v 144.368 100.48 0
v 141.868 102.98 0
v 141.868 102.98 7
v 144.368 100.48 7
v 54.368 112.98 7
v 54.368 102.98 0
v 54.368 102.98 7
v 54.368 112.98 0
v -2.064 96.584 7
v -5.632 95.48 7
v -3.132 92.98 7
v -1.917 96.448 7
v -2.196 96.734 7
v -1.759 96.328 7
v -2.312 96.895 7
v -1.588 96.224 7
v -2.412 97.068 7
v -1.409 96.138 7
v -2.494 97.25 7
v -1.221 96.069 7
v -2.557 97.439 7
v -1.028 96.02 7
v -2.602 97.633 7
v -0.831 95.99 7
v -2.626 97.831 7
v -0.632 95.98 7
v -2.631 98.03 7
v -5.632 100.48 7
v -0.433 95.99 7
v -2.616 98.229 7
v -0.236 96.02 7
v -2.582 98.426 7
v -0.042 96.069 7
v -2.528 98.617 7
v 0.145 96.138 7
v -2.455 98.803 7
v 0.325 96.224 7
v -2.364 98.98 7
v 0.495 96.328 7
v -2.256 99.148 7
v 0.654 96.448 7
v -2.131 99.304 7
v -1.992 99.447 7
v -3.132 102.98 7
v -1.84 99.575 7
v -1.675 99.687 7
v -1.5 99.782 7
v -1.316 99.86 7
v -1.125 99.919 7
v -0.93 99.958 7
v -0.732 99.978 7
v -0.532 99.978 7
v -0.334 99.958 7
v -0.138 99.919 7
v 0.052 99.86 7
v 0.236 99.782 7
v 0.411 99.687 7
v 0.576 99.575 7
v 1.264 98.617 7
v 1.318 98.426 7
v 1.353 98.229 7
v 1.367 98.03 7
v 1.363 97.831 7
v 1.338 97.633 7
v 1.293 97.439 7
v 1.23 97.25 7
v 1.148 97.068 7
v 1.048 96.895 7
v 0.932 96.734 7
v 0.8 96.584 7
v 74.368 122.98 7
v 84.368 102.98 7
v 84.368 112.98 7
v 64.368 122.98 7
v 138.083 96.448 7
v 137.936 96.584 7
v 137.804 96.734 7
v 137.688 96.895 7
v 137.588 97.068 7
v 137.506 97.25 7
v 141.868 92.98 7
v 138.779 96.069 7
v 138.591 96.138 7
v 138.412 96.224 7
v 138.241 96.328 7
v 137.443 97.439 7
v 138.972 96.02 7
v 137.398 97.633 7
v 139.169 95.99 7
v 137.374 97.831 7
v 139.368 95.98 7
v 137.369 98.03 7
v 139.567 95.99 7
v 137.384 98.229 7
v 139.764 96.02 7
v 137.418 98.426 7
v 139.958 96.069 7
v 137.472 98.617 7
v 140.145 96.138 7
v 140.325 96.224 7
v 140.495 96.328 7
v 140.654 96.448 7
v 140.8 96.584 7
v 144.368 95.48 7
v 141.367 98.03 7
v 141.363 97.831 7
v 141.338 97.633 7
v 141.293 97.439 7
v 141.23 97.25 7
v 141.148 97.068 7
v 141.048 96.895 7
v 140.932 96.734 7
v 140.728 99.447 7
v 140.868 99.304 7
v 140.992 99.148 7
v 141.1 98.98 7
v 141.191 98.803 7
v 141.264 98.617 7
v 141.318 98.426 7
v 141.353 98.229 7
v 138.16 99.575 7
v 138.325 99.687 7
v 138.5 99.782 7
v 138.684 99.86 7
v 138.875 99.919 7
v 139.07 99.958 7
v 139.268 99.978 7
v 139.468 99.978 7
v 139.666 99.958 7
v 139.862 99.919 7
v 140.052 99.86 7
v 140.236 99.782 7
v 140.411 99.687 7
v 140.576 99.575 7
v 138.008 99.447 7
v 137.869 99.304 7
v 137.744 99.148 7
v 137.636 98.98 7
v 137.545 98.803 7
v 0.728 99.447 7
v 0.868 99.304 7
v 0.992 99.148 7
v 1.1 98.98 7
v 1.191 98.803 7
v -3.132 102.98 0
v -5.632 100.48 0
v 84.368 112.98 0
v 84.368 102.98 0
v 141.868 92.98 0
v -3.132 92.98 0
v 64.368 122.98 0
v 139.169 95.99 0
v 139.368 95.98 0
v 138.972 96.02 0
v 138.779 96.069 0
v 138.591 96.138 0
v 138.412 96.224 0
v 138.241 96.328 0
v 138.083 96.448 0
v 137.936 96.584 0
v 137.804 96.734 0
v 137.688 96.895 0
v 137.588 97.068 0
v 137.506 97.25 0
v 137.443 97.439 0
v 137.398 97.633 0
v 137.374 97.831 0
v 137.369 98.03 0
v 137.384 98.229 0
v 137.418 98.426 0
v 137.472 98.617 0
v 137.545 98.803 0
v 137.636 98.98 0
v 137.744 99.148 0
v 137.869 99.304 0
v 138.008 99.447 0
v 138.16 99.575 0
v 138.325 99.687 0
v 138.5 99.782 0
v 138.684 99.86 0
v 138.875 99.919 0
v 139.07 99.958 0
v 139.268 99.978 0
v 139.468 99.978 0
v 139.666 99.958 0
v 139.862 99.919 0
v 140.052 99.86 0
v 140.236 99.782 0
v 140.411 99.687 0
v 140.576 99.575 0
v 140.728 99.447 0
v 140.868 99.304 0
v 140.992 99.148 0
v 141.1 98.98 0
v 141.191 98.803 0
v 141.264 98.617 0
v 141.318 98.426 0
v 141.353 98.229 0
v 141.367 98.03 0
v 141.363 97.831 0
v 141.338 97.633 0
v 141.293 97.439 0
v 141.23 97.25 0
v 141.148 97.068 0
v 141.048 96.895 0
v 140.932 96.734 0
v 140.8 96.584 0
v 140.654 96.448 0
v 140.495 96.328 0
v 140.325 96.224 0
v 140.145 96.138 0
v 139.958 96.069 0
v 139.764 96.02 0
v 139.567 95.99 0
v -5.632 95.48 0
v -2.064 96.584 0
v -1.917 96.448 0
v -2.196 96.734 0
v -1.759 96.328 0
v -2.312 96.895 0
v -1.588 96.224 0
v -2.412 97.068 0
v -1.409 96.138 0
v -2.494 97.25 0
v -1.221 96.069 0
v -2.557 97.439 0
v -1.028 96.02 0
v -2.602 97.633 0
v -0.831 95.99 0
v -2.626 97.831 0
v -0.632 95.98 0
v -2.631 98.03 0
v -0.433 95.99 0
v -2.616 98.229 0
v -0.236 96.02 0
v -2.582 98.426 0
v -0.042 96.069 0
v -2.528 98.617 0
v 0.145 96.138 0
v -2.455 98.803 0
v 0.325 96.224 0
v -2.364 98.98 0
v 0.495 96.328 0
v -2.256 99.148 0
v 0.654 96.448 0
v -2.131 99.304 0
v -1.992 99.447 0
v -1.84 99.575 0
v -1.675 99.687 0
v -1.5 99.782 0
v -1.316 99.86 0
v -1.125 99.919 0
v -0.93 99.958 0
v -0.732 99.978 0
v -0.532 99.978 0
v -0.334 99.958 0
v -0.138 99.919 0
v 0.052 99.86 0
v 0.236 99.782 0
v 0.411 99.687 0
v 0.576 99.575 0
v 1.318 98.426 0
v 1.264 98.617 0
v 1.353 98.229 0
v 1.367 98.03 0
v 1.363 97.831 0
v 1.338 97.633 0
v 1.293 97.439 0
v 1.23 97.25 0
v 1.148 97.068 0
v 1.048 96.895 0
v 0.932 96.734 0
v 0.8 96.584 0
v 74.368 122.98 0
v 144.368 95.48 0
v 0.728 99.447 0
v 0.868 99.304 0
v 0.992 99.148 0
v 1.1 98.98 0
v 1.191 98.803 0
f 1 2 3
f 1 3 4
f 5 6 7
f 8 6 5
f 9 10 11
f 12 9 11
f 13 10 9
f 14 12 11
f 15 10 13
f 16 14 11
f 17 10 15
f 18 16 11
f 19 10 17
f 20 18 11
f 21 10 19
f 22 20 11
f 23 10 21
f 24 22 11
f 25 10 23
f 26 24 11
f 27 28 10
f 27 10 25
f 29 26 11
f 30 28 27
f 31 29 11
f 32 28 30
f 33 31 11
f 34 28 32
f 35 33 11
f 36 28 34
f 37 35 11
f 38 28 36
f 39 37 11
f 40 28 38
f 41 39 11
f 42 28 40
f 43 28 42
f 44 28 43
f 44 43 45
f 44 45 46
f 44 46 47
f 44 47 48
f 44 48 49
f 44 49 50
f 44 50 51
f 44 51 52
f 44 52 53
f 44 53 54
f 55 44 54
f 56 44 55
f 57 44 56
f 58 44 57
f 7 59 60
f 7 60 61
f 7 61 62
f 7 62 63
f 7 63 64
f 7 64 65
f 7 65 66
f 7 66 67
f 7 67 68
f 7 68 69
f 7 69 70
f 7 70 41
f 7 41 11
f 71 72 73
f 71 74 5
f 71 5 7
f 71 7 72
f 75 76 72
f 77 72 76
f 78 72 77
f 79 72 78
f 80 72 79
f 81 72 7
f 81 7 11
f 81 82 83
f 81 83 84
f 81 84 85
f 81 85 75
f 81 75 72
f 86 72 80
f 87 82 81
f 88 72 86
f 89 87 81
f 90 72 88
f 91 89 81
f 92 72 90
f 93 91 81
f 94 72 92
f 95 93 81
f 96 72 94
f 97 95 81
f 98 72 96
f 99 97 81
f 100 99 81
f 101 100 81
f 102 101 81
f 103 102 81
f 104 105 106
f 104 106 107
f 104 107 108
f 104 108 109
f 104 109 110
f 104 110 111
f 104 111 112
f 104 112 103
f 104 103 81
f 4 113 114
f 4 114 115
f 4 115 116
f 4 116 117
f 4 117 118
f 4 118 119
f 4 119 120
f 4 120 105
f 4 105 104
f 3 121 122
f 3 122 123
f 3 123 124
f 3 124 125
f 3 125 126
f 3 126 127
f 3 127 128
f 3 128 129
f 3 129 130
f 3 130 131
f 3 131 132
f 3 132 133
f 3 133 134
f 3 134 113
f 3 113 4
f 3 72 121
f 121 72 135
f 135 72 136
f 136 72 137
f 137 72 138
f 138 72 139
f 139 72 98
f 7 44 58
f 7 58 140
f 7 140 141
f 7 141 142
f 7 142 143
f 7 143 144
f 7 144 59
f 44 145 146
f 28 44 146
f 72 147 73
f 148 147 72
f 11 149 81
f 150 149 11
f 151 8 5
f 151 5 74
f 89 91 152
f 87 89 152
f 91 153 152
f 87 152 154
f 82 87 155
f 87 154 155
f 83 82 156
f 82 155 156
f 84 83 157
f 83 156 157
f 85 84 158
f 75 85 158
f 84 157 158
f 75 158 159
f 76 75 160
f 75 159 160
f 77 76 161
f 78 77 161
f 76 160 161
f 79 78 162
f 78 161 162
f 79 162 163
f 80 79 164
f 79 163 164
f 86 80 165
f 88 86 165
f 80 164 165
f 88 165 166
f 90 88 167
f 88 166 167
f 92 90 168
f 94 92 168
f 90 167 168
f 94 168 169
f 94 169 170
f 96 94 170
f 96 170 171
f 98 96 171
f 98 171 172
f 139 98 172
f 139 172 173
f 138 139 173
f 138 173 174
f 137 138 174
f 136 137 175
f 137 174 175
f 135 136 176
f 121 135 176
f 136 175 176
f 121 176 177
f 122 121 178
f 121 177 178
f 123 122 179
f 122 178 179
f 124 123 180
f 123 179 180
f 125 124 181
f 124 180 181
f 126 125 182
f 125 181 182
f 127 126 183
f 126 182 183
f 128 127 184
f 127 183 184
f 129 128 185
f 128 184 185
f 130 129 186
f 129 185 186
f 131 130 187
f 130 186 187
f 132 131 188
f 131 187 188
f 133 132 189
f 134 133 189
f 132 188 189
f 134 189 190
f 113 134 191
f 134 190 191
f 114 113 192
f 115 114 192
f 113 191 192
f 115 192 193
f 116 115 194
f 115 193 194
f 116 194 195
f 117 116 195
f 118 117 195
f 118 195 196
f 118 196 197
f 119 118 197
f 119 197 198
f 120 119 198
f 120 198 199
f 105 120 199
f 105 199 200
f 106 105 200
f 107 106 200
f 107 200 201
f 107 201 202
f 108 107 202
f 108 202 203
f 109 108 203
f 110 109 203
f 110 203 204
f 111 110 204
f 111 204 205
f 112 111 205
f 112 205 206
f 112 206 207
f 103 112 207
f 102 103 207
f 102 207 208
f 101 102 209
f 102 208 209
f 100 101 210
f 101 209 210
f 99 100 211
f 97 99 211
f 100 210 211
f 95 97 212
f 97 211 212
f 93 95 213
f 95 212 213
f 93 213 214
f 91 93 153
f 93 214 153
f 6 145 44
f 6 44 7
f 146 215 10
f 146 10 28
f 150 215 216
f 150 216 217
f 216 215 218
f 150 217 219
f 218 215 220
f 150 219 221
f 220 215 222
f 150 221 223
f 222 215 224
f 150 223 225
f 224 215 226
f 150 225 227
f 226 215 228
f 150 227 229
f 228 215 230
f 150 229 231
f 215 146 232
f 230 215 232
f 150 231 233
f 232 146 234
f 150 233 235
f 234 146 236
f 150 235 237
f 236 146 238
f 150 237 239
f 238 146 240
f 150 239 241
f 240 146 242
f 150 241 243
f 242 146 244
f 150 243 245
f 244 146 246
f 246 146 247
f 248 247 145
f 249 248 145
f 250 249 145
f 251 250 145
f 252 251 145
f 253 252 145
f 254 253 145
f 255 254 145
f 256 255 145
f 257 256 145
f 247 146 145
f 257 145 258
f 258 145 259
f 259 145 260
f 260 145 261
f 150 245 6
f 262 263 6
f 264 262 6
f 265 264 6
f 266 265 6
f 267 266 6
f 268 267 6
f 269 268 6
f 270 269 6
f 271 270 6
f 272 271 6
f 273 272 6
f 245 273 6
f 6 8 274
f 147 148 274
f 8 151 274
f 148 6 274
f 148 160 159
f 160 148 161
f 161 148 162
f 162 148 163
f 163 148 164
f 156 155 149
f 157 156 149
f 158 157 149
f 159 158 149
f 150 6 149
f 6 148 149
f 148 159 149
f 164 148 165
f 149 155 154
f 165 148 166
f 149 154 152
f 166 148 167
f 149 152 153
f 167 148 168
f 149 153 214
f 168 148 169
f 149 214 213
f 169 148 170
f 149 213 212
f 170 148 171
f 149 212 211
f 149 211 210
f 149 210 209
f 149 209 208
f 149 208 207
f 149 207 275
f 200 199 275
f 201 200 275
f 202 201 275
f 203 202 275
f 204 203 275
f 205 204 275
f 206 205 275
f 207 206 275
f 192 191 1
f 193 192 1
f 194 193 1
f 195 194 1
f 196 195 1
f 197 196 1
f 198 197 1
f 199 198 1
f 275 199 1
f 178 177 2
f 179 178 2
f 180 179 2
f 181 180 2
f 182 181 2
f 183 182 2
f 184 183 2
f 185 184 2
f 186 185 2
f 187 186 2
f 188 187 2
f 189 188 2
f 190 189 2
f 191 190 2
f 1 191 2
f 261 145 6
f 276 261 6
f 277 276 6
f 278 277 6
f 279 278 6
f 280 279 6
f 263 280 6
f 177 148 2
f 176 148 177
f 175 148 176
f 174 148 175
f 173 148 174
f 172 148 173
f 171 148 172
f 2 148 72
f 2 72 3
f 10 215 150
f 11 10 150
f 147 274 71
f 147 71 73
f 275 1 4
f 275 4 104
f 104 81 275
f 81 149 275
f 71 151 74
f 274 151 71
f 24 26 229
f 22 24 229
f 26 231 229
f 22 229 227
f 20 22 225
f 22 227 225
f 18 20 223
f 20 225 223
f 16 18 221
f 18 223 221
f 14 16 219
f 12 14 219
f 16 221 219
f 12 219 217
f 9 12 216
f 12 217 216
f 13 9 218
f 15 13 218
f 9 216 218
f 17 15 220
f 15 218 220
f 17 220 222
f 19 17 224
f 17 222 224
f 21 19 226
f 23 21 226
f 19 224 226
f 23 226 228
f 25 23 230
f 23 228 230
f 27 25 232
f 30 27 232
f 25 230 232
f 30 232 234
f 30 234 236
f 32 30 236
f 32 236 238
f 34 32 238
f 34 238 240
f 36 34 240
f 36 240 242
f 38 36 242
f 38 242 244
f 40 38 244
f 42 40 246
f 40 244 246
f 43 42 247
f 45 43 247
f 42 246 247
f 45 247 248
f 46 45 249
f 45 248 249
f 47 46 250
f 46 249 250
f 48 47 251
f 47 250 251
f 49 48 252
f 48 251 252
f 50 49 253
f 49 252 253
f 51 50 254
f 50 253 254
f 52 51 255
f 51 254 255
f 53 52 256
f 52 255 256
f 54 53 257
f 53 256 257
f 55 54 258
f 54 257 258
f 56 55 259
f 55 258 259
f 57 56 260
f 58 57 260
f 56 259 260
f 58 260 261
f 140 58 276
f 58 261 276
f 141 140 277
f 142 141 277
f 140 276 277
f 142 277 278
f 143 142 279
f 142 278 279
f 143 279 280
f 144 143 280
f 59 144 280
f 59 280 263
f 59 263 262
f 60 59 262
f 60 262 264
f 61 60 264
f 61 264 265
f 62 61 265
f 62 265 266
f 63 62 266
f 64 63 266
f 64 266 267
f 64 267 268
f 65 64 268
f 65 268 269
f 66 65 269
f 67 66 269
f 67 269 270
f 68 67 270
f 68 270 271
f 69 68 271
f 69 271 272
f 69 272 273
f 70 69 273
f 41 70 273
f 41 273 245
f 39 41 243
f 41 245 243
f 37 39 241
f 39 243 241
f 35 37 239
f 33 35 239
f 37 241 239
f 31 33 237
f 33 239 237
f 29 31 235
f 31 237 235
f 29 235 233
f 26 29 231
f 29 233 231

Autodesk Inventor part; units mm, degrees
ref_plane "YZ Plane" through (0, 0, 0) normal (1, 0, 0) x (0, 1, 0)
ref_plane "XZ Plane" through (0, 0, 0) normal (0, 1, 0) x (-1, 0, 0)
ref_plane "XY Plane" through (0, 0, 0) normal (0, 0, 1) x (1, 0, 0)
sketch "Sketch1" plane through (0, 0, 0) normal (0, 0, 1) x (1, 0, 0)
  line L0 (-3.1319, 102.9805) -> (141.8681, 102.9805)
  line L1 (144.3681, 100.4805) -> (144.3681, 95.4805)
  line L2 (141.8681, 92.9805) -> (-3.1319, 92.9805)
  line L3 (-5.6319, 95.4805) -> (-5.6319, 100.4805)
  line L4 (141.8681, 102.9805) -> (144.3681, 100.4805)
  line L5 (-3.1319, 102.9805) -> (-5.6319, 100.4805)
  line L6 (-5.6319, 95.4805) -> (-3.1319, 92.9805)
  line L7 (141.8681, 92.9805) -> (144.3681, 95.4805)
  line L8 (69.3681, 92.9805) -> (69.3681, 132.9805) construction
  line L9 (84.3681, 102.9805) -> (54.3681, 102.9805)
  line L10 (54.3681, 102.9805) -> (54.3681, 112.9805)
  line L11 (64.3681, 122.9805) -> (74.3681, 122.9805)
  line L12 (84.3681, 112.9805) -> (84.3681, 102.9805)
  line L13 (74.3681, 122.9805) -> (84.3681, 112.9805)
  line L14 (54.3681, 112.9805) -> (64.3681, 122.9805)
  circle A0 centre (69.3681, 107.9805) radius 12.5 construction
  point P0 (0, 0)
  point P1 (-5.6319, 102.9805)
  point P2 (144.3681, 92.9805)
  point P3 (144.3681, 102.9805)
  point P4 (-5.6319, 92.9805)
  point P5 (54.3681, 122.9805)
  point P6 (84.3681, 122.9805)
  dimension "d0" = 150
  dimension "d1" = 10
  dimension "d2" = 2.5
  dimension "d3" = 2.5
  dimension "d4" = 2.5
  dimension "d5" = 2.5
  dimension "d6" = 2.5
  dimension "d7" = 2.5
  dimension "d8" = 2.5
  dimension "d9" = 2.5
  dimension "d12" = 40
  dimension "d13" = 30
  dimension "d14" = 20
  dimension "d15" = 15
  dimension "d16" = 10
  dimension "d17" = 10
  dimension "d18" = 10
  dimension "d19" = 10
  dimension "d20" = 25
extrude "Extrusion1" add sketch "Sketch1" along normal blind 7
sketch "Sketch2" plane through (0, 0, 7) normal (0, 0, 1) x (1, 0, 0)
  line L0 (74.3681, 122.9805) -> (64.3681, 122.9805) construction
  line L1 (69.3681, 122.9805) -> (69.3681, 92.9805) construction
  line L2 (-3.1319, 92.9805) -> (141.8681, 92.9805) construction
  line L3 (-5.6319, 100.4805) -> (-5.6319, 95.4805) construction
  point P0 (0, 0)
  point P1 (-0.6319, 97.9805)
  point P2 (139.3681, 97.9805)
  dimension "d21" = 5
hole "Hole1" at (-0.6319, 97.9805, 7) at (139.3681, 97.9805, 7) direction (0, 0, -1) diameter 4 end through all
equation "\"d2\" = d4"
equation "\"d3\" = d2"
equation "\"d5\" = d4"
equation "\"d6\" = d4"
equation "\"d7\" = d6"
equation "\"d8\" = d4"
equation "\"d9\" = d8"
equation "\"d17\" = d16"
equation "\"d18\" = d16"
equation "\"d19\" = d18"
properties part number "Lever" material "MDF Medium Density Fiberboard"
